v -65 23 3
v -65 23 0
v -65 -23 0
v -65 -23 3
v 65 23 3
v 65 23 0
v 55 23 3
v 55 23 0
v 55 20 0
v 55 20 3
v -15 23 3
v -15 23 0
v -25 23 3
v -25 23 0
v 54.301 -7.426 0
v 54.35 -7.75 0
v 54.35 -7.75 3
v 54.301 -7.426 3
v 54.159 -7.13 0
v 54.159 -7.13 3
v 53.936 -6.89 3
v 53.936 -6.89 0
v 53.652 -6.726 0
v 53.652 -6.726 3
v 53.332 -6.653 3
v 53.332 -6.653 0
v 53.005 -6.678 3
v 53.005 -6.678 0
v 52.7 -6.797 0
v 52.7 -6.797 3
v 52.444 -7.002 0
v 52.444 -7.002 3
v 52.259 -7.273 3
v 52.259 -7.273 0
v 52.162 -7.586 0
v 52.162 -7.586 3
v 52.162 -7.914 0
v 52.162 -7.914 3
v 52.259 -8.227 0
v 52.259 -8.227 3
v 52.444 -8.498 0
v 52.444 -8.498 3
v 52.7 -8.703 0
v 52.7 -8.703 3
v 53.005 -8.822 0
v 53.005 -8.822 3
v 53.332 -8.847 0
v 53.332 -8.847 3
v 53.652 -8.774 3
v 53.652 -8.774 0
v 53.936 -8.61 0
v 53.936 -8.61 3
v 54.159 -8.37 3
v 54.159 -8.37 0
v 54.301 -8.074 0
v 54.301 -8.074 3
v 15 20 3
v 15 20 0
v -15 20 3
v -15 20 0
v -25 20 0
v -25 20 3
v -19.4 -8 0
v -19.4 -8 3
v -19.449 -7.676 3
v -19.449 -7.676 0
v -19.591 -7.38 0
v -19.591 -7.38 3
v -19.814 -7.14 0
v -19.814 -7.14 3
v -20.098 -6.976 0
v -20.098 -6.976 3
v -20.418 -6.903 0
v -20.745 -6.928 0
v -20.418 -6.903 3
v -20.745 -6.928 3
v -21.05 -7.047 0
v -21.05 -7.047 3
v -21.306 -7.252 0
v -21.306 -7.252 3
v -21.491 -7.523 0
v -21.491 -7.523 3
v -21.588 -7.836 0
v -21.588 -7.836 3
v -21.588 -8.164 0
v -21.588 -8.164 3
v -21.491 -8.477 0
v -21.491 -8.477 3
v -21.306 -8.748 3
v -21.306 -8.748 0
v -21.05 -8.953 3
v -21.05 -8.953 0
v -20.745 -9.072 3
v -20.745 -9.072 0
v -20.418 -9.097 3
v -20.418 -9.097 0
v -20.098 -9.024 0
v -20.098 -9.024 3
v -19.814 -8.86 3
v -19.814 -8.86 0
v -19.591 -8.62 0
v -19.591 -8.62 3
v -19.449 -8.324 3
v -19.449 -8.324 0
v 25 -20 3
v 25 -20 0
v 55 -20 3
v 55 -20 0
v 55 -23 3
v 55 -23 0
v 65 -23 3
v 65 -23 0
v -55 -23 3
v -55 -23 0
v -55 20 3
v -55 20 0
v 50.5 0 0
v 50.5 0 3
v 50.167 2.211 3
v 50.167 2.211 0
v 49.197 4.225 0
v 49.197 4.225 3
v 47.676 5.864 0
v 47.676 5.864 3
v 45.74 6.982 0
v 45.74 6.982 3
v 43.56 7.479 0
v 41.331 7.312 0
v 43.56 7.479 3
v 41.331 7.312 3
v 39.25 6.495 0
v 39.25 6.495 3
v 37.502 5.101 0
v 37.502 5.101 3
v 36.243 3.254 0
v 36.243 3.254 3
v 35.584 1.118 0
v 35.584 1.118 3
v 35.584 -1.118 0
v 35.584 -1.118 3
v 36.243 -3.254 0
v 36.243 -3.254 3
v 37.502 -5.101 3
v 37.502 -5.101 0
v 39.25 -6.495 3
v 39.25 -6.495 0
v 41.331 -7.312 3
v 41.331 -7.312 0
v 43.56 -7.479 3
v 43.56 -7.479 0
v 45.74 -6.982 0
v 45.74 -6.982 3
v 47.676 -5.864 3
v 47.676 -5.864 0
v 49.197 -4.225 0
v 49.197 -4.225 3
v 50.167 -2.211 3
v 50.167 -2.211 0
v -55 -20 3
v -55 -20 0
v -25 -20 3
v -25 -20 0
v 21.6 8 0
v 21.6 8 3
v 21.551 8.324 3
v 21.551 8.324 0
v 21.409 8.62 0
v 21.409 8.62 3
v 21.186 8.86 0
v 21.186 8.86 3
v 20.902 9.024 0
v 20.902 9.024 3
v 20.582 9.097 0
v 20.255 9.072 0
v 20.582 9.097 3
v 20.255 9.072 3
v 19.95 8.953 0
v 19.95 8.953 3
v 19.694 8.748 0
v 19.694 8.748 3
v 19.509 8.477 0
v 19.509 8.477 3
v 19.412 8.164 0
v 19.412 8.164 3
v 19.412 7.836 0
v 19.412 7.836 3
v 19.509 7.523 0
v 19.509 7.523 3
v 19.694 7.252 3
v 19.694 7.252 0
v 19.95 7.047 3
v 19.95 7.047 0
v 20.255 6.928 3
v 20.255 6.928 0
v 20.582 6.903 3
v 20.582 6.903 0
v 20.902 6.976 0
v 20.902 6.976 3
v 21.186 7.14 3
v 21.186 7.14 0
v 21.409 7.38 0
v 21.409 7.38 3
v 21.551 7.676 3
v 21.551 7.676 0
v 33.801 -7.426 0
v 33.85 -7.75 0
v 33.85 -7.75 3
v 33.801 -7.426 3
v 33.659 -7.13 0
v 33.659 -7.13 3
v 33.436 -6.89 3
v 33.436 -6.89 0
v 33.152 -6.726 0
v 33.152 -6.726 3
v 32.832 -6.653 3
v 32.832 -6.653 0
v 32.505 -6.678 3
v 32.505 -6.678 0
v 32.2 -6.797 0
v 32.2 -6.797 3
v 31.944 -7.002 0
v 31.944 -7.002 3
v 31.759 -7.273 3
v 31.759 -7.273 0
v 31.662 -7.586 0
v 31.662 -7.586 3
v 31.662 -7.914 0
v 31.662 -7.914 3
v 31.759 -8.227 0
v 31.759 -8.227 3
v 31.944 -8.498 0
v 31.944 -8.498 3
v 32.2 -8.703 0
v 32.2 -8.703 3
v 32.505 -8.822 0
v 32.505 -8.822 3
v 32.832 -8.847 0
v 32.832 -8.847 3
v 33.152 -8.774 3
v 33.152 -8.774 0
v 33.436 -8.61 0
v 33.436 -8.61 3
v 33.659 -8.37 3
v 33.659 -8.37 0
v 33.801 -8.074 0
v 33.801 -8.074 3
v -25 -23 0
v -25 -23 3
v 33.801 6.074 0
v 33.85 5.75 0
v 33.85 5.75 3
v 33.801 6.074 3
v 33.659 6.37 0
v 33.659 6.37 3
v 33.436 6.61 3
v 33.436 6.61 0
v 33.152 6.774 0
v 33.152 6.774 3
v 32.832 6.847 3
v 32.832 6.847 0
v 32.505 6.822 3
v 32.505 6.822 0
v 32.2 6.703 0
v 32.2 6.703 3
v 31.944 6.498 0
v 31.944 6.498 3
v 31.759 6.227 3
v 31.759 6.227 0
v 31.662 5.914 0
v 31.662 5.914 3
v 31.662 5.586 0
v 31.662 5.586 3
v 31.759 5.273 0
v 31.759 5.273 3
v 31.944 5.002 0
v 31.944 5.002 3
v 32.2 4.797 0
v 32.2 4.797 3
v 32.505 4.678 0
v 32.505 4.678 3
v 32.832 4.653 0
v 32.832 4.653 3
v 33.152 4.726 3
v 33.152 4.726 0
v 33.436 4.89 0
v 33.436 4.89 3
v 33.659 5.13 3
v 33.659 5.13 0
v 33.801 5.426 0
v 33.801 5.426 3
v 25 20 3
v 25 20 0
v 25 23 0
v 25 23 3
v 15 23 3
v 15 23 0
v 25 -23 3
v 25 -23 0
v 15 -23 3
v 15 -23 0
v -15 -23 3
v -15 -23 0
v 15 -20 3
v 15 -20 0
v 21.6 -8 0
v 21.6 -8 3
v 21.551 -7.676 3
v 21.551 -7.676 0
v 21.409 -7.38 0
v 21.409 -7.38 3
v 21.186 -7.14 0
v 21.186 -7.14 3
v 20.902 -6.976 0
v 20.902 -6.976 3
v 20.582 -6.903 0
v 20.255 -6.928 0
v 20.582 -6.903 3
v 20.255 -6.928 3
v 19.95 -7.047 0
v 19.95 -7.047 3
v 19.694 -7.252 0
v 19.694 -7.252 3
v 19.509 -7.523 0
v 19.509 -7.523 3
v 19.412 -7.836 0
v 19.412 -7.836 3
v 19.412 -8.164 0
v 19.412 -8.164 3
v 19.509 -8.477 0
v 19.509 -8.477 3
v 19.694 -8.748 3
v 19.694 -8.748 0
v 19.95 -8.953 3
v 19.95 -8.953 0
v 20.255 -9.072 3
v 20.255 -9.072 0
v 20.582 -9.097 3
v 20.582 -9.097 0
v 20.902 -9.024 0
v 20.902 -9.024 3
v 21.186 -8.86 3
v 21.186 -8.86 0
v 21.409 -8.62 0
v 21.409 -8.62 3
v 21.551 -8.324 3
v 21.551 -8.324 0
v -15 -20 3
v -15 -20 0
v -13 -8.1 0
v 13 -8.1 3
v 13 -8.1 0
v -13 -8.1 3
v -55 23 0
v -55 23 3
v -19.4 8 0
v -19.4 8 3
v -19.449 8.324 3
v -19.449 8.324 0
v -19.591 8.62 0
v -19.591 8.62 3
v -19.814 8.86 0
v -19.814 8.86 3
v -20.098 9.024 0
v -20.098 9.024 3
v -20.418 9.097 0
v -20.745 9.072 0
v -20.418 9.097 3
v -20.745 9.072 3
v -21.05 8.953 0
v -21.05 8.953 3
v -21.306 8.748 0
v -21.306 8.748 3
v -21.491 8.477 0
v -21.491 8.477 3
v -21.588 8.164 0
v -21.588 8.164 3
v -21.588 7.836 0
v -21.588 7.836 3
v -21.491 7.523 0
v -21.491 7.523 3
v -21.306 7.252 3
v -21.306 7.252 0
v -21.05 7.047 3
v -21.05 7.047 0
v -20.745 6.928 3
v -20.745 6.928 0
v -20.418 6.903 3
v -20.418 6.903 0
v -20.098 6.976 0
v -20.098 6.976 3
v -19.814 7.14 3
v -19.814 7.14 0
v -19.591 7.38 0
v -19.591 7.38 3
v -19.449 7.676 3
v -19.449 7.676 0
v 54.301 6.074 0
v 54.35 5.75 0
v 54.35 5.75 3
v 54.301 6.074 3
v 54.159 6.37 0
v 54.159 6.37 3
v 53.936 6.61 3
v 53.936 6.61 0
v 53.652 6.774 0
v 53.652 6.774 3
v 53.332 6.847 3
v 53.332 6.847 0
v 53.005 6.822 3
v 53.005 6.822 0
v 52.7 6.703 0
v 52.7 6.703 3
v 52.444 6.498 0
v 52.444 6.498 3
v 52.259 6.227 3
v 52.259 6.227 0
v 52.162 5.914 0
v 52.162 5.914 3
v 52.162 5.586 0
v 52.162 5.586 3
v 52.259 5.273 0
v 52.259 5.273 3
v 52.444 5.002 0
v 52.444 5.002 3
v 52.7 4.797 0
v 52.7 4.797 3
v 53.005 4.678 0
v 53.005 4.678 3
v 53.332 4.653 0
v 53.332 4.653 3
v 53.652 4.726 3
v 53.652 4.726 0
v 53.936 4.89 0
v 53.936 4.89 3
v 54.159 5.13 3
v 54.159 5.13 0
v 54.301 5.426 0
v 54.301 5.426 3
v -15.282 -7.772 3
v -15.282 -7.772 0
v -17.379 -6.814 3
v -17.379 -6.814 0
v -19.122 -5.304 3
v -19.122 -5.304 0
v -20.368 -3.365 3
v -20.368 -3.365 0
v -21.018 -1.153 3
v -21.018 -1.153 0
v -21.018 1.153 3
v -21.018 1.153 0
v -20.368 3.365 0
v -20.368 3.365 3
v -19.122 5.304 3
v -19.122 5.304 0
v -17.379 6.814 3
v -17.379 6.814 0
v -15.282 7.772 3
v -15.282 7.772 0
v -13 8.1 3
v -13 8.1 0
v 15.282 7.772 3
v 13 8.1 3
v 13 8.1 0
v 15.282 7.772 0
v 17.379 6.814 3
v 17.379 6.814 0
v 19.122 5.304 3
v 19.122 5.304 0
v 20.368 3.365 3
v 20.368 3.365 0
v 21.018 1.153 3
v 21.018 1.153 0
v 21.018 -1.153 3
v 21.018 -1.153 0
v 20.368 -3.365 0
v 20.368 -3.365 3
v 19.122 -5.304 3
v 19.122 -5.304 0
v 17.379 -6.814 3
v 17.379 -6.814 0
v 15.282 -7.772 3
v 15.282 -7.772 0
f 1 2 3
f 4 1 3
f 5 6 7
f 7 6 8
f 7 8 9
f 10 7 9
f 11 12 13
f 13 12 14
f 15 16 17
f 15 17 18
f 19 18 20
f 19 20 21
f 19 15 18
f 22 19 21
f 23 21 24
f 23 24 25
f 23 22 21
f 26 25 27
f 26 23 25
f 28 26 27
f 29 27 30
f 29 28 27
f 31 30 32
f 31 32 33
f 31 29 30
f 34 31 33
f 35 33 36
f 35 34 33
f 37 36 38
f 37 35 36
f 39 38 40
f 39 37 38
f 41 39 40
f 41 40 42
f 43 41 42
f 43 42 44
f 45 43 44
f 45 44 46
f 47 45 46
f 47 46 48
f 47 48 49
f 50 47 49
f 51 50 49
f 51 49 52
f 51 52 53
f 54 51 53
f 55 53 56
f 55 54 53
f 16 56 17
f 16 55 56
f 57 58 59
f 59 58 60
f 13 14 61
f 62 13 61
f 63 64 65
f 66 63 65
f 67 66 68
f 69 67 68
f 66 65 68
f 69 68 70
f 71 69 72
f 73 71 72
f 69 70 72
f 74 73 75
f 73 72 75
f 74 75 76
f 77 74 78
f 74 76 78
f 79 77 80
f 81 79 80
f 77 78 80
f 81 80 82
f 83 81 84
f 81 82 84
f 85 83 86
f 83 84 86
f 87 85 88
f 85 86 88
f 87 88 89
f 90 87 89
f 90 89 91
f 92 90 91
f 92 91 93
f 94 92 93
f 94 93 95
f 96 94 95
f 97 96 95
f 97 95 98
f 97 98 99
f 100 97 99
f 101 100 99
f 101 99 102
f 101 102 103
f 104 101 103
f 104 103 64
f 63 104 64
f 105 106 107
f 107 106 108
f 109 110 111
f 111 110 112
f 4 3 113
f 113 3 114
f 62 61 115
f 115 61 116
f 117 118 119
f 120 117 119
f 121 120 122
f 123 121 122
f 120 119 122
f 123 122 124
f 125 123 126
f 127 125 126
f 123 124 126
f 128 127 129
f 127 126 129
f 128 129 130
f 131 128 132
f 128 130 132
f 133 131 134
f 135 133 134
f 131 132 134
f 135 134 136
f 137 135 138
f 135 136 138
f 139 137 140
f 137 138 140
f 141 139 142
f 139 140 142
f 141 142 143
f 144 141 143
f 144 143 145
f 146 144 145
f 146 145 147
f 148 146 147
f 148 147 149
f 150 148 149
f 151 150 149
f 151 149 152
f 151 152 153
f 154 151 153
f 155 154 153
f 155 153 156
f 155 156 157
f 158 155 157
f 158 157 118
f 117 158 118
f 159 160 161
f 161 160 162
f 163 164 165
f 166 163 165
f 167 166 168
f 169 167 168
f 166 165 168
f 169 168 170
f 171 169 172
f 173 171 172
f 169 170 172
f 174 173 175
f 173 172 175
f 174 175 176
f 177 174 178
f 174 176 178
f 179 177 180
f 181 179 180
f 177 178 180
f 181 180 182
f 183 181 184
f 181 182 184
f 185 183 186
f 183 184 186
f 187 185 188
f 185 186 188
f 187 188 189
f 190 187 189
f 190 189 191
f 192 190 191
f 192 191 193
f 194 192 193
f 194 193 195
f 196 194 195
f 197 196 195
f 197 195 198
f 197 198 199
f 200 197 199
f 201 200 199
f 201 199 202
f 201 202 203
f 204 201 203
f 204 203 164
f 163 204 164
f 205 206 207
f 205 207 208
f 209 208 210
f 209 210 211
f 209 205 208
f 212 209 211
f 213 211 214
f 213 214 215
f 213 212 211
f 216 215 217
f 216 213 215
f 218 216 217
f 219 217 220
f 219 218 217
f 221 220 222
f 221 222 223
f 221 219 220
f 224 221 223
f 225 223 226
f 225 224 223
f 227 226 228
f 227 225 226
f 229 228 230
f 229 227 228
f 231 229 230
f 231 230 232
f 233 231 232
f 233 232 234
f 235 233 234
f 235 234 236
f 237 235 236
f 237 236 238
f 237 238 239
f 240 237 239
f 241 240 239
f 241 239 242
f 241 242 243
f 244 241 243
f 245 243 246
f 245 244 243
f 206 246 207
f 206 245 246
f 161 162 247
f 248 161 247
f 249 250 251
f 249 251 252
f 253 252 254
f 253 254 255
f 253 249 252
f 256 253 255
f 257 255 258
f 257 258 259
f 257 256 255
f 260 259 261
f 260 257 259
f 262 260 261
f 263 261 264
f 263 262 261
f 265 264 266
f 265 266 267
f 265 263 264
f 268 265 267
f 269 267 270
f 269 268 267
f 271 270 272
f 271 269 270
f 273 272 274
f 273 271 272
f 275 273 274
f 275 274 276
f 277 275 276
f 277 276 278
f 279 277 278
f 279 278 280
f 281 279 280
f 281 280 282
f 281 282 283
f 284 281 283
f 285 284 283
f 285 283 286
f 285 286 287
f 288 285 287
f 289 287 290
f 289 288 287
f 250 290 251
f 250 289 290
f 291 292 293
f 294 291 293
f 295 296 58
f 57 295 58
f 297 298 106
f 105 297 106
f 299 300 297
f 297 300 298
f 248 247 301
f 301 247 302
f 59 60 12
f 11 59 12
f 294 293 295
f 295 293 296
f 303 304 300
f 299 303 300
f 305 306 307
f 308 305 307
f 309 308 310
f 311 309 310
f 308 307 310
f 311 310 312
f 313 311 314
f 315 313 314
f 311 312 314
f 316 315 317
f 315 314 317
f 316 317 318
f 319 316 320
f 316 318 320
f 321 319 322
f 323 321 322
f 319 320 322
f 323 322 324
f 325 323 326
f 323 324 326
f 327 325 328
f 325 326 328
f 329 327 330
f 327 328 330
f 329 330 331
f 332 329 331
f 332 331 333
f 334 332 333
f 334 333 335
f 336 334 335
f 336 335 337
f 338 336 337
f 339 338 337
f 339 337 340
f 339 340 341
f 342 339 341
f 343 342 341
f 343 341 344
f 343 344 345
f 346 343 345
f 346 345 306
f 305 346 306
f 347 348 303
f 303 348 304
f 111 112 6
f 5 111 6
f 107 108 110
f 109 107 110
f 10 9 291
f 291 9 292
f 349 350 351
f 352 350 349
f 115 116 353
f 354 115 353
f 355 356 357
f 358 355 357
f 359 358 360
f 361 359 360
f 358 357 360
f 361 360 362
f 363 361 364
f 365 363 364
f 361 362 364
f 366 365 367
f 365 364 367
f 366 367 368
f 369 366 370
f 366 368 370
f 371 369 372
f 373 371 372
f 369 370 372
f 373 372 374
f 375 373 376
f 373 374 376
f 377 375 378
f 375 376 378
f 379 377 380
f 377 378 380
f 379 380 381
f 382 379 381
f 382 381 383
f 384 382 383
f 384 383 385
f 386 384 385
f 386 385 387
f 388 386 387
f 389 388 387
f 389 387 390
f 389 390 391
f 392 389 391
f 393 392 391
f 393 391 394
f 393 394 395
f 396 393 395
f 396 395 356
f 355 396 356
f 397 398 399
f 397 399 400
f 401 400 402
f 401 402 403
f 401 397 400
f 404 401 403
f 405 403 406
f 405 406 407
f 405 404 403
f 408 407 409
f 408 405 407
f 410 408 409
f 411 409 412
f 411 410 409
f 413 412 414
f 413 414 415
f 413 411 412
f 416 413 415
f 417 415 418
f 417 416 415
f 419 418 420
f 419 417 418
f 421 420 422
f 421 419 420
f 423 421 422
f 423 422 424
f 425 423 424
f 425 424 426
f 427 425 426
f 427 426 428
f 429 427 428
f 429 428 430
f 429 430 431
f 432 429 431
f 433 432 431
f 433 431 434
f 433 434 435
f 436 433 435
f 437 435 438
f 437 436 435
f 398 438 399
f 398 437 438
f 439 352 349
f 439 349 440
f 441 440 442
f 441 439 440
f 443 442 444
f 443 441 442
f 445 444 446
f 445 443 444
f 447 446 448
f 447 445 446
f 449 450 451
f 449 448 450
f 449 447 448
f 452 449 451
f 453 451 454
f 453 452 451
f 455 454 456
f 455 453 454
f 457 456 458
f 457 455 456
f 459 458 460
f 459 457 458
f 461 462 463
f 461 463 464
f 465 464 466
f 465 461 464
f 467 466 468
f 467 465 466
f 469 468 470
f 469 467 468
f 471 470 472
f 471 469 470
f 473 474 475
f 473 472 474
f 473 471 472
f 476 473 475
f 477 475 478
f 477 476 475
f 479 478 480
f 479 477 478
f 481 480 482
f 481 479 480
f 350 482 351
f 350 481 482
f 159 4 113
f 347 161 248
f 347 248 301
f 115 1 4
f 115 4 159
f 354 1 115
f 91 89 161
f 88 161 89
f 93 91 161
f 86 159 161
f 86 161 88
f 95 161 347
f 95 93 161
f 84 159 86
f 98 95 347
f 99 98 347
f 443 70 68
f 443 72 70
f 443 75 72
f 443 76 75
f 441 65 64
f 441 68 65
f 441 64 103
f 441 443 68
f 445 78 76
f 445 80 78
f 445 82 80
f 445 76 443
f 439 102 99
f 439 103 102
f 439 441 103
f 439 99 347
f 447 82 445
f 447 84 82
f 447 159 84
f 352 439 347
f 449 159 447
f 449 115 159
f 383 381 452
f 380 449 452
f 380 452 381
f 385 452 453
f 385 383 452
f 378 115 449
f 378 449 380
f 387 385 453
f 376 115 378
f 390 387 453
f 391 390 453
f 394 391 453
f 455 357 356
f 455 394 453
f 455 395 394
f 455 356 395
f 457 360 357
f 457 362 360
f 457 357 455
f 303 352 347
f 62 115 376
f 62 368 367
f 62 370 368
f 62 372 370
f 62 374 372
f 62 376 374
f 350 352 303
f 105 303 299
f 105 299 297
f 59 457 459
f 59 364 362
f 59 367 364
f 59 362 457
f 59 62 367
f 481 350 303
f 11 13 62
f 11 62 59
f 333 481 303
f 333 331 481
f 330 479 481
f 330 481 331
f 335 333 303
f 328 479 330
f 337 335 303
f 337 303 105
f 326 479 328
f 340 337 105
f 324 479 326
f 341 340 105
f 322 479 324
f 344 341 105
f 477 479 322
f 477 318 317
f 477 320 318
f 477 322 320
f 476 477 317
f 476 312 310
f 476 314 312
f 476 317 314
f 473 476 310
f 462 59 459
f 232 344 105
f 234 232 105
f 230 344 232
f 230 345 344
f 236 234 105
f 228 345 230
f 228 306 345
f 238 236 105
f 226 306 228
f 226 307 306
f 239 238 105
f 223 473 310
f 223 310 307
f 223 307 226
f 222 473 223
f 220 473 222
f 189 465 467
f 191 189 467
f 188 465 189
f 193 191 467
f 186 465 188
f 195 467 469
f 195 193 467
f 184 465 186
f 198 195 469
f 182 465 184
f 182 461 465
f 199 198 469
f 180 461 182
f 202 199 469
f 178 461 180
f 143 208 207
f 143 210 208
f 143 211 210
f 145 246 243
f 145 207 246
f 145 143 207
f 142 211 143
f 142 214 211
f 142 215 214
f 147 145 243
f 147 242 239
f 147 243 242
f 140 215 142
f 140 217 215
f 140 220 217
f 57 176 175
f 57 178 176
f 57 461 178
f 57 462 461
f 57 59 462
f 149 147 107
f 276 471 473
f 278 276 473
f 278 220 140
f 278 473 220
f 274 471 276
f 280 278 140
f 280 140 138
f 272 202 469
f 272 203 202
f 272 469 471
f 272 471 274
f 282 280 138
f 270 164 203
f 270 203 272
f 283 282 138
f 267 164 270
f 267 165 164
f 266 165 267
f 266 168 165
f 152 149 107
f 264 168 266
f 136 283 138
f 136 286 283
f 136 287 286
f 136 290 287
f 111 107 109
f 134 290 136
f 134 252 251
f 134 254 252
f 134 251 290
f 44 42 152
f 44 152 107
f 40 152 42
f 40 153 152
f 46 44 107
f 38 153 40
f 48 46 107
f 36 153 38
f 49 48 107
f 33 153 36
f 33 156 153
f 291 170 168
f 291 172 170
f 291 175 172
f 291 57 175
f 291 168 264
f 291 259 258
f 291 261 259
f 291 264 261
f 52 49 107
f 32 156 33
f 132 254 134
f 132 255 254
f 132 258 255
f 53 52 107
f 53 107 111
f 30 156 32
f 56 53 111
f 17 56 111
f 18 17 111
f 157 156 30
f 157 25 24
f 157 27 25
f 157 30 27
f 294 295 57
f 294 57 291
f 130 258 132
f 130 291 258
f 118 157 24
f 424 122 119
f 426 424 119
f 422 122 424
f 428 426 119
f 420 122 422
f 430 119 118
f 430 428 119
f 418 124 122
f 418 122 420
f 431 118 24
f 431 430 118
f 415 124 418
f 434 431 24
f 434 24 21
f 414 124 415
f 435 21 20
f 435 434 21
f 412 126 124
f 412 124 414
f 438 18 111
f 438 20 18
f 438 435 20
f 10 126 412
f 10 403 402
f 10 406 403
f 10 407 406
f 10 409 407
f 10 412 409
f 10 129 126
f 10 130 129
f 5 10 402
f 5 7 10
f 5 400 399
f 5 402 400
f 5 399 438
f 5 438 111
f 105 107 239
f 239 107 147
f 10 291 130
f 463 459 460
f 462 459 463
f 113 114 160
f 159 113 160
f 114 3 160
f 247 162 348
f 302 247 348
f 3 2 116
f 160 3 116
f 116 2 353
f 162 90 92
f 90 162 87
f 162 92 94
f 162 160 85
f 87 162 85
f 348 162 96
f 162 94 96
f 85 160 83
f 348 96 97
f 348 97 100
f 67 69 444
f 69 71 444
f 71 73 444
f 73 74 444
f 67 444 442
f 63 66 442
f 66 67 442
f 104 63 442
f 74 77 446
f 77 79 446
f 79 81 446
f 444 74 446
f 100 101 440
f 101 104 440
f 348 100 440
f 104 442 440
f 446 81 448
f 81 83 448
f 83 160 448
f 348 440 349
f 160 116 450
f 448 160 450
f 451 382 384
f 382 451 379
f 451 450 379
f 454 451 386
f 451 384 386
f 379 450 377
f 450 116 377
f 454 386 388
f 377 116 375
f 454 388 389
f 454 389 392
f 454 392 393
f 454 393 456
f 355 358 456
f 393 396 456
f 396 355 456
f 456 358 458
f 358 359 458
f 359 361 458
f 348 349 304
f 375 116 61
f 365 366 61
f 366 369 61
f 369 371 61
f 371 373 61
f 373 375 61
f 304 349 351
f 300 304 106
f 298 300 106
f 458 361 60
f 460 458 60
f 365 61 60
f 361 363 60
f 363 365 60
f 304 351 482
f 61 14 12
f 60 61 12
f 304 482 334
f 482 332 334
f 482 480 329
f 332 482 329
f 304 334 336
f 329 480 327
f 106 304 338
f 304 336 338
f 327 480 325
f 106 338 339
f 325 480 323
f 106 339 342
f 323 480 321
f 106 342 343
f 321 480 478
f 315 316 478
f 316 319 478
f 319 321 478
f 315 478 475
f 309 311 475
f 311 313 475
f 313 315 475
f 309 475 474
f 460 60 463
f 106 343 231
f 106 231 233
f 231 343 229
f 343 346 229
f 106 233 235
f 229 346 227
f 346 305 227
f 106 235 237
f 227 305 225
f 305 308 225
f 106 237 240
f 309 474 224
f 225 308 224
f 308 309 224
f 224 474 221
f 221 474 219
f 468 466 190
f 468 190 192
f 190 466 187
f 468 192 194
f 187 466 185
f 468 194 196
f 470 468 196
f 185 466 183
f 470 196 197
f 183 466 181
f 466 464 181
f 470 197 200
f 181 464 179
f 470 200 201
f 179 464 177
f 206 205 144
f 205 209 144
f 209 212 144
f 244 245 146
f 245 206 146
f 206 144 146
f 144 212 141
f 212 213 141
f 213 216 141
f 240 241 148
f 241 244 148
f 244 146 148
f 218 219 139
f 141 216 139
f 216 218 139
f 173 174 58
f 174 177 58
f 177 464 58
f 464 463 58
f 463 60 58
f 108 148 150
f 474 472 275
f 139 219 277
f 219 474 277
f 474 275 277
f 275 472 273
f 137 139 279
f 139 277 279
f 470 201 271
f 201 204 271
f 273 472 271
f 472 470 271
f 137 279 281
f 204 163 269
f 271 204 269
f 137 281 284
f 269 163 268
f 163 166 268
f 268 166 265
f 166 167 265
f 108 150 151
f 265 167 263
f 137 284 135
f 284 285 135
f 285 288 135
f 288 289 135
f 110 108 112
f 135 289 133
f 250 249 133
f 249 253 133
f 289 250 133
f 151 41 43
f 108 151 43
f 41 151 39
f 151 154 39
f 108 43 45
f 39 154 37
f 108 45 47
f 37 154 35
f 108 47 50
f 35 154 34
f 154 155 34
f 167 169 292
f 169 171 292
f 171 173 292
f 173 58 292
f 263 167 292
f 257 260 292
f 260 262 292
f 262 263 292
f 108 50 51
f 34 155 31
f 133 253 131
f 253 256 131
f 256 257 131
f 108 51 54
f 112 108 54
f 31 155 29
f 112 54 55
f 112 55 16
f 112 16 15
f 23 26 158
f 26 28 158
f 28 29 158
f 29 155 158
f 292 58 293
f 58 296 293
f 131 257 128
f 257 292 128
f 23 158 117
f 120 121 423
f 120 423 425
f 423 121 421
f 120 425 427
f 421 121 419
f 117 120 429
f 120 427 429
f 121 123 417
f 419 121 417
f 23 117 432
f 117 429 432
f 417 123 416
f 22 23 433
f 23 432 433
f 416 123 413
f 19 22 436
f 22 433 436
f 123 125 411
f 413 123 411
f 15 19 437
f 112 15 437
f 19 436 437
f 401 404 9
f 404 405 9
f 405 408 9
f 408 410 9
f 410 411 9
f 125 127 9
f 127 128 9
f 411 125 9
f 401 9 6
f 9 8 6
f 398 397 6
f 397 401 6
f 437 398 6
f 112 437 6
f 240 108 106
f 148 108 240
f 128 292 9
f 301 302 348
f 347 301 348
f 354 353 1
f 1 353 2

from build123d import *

# Parameters (mm, degrees)
SKETCH1_R           = 1.1
BOSS_EXTRUDE1_DEPTH = 3
SKETCH4_R           = 1.1
CUT_EXTRUDE2_DEPTH  = 70.014491232
SKETCH5_R           = 7.5
CUT_EXTRUDE3_DEPTH  = 70.014491232


with BuildPart() as part:
    # Sketch1 → Boss-Extrude1 (new body)
    with BuildSketch(Plane.XY):
        Polygon((-55, -20), (-25, -20), (-25, -23), (-15, -23), (-15, -20), (15, -20), (15, -23), (25, -23), (25, -20), (55, -20), (55, -23), (65, -23), (65, 23), (55, 23), (55, 20), (25, 20), (25, 23), (15, 23), (15, 20), (-15, 20), (-15, 23), (-25, 23), (-25, 20), (-55, 20), (-55, 23), (-65, 23), (-65, -23), (-55, -23), align=None)
        with Locations((32.75, 5.75)):
            Circle(SKETCH1_R, mode=Mode.SUBTRACT)
        with Locations((53.25, 5.75)):
            Circle(SKETCH1_R, mode=Mode.SUBTRACT)
        with Locations((53.25, -7.75)):
            Circle(SKETCH1_R, mode=Mode.SUBTRACT)
        with Locations((32.75, -7.75)):
            Circle(SKETCH1_R, mode=Mode.SUBTRACT)
    extrude(amount=BOSS_EXTRUDE1_DEPTH)

    # Sketch4 → Cut-Extrude2 (cut, through all)
    with BuildSketch(Plane.XY.offset(3)):
        with Locations((-20.5, 8)):
            Circle(SKETCH4_R)
        with Locations((-20.5, -8)):
            Circle(SKETCH4_R)
        with Locations((20.5, 8)):
            Circle(SKETCH4_R)
        with Locations((20.5, -8)):
            Circle(SKETCH4_R)
        with BuildLine():
            Line((-13, 8.1), (13, 8.1))
            ThreePointArc((13, 8.1), (21.1, 0), (13, -8.1))
            Line((13, -8.1), (-13, -8.1))
            ThreePointArc((-13, -8.1), (-21.1, 0), (-13, 8.1))
        make_face()
    extrude(amount=-CUT_EXTRUDE2_DEPTH, mode=Mode.SUBTRACT)

    # Sketch5 → Cut-Extrude3 (cut, through all)
    with BuildSketch(Plane.XY.offset(3)):
        with Locations((43, 0)):
            Circle(SKETCH5_R)
    extrude(amount=-CUT_EXTRUDE3_DEPTH, mode=Mode.SUBTRACT)


solid = part.part
